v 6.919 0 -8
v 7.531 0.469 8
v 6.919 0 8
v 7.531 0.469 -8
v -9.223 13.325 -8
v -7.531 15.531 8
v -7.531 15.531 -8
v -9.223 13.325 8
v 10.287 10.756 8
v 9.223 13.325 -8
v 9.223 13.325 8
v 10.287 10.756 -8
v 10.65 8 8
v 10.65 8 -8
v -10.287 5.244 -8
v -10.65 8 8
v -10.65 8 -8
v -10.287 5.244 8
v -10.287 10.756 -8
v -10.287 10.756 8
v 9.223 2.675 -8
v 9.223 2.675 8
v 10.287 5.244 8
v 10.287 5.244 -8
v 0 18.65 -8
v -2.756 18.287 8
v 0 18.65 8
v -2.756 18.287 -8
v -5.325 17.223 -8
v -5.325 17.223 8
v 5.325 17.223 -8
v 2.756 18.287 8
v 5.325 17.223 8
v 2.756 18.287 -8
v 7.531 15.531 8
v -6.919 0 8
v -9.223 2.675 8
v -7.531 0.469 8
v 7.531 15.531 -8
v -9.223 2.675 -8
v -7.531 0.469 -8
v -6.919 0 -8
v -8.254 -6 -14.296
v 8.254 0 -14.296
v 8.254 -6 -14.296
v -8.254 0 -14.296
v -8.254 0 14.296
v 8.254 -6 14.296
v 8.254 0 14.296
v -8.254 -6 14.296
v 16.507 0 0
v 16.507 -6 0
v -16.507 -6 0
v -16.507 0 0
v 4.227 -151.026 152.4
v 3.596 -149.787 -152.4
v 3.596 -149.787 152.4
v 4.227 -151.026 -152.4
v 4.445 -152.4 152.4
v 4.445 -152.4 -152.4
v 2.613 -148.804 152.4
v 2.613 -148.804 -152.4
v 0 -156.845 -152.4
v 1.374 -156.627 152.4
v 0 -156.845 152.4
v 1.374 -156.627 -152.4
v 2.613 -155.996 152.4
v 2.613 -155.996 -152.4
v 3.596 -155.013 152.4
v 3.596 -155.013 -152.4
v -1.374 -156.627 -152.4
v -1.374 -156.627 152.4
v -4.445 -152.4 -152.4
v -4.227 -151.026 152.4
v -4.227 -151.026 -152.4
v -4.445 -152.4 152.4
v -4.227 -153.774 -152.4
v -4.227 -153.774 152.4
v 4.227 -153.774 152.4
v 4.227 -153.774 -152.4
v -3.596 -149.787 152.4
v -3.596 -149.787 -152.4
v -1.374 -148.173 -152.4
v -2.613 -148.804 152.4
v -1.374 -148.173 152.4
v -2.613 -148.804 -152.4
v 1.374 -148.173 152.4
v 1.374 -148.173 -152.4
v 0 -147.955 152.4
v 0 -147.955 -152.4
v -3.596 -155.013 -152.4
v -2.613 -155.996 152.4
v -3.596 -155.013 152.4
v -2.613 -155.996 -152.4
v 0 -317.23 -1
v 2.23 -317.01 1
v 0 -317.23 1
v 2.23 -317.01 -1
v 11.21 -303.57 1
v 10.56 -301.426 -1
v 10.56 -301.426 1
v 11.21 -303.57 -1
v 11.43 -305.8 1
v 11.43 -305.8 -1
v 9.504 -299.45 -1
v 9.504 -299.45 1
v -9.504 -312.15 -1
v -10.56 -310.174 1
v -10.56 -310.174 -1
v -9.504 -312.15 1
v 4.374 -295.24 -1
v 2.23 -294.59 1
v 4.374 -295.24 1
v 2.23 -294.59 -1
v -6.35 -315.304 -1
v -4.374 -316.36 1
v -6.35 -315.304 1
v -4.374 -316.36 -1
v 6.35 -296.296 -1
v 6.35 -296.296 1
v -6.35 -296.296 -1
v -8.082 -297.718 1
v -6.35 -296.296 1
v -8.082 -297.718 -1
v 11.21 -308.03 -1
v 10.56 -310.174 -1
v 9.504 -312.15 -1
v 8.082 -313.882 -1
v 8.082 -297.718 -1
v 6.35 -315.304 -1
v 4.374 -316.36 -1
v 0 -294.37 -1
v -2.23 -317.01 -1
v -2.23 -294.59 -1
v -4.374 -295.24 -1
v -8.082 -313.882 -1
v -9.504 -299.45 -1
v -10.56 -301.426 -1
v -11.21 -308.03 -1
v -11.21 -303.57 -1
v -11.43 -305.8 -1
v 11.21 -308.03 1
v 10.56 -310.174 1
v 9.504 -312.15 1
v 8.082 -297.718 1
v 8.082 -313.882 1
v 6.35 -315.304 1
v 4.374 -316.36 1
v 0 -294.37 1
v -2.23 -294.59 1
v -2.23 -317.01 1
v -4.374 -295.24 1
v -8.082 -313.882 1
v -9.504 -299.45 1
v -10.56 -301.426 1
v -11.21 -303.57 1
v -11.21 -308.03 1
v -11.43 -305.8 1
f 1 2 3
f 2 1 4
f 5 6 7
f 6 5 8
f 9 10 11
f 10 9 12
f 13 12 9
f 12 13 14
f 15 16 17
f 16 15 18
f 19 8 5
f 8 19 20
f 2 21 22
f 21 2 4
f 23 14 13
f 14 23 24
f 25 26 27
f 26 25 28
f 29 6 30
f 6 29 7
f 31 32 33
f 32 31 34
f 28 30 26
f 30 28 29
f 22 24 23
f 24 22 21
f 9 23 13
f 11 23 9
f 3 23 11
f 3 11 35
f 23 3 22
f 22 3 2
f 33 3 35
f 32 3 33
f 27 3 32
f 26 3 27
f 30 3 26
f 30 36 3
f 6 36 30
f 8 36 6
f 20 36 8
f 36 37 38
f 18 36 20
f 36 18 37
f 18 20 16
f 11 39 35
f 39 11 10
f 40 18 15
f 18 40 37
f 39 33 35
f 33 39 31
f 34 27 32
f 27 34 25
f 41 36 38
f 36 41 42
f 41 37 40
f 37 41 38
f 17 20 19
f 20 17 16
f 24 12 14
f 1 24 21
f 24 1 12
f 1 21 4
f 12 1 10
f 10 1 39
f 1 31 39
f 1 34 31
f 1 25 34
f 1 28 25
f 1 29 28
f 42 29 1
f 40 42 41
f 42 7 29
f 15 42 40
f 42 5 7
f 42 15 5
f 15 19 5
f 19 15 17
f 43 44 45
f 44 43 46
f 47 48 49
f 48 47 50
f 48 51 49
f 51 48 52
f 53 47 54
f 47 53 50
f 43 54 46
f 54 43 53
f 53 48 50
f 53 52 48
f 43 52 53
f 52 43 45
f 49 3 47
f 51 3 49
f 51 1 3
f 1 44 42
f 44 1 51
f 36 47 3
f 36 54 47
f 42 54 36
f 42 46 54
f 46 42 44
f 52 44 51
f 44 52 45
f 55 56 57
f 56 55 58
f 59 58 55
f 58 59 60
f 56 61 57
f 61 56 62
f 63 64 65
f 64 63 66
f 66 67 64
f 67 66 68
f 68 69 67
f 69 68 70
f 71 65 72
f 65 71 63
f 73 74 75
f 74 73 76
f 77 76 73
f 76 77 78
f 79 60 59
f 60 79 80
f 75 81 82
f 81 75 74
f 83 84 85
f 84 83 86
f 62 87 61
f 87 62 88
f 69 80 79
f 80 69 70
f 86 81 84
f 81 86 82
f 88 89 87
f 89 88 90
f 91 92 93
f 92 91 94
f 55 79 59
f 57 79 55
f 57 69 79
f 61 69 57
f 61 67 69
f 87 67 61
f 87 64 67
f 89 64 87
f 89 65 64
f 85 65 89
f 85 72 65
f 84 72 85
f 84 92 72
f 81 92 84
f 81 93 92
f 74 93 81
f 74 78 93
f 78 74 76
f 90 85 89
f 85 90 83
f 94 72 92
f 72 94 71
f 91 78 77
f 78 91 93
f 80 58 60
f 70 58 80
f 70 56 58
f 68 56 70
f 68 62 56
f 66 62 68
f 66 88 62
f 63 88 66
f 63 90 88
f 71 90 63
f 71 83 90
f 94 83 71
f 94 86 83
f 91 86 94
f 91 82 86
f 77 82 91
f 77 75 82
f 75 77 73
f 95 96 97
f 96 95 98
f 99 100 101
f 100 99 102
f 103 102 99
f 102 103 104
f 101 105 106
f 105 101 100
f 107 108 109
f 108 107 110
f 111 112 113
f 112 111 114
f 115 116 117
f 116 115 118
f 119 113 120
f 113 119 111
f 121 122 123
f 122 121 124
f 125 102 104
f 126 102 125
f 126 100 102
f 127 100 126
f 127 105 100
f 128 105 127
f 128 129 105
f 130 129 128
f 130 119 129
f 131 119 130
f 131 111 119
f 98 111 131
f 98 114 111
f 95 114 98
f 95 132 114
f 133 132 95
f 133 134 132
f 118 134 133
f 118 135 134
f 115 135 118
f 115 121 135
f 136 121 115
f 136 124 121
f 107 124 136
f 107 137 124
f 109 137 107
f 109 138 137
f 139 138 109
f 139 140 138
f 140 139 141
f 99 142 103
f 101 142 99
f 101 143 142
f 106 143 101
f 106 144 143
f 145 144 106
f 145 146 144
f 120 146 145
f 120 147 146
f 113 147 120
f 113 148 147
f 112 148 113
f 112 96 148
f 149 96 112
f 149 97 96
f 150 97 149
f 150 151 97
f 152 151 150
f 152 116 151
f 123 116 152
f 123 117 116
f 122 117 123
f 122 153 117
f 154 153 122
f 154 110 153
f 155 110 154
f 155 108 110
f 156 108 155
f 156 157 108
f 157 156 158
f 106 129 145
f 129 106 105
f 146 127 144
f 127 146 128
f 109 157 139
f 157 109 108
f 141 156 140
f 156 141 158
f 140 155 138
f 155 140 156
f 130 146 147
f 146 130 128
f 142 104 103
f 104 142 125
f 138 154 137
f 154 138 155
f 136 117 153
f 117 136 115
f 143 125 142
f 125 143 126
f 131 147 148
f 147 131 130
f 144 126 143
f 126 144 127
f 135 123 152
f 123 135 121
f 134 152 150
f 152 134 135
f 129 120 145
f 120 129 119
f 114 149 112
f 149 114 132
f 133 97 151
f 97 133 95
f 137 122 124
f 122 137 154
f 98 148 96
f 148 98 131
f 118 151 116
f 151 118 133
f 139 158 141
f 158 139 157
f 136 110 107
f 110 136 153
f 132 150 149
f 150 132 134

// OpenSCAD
// Auto-generated by scripts/author_from_manifest.py (Phase D.3).
// Source: data/phase_d_manifest.json (sku_intent='tyco-ty3596-dry-pendent-286f').
// Do not hand-edit — regenerate from the manifest.
//
// @part tyco_ty3596_dry_pendent_286f
// @kind sprinkler_head
// @category head.pendant.k56
// @display-name "Tyco TY3596 Dry Pendent K5.6 286°F"
// @mfg tyco_fire_protection
// @mfg-pn TY3596
// @listing UL FM
// @hazard-classes LH OH1
// @price-usd 82.00
// @install-minutes 14
// @crew journeyman
// @k-factor 5.6
// @orientation pendant
// @response standard
// @temperature 286F
// @param size_in number default=0.5 label="Size" unit="in"
// @port inlet position=[0,0.014,0] direction=[0,1,0] style=NPT_threaded size_in=0.5 role=drop

size_in = 0.5;
k_factor = 5.6;

length_mm   = 304.80;
body_dia_mm = 25.40;
thread_od   = 21.3;
thread_len  = 16;
deflector_d = body_dia_mm * 0.9;

 union() {
    translate([0, thread_len/2, 0])
        cylinder(h = thread_len, d = thread_od, center = true, $fn = 24);
    translate([0, -3, 0])
        rotate([90, 0, 0])
        cylinder(h = 6, d = thread_od * 1.55, $fn = 6, center = true);
    translate([0, -length_mm/2, 0])
        cylinder(h = length_mm, d = body_dia_mm * 0.35, center = true, $fn = 20);
    translate([0, -length_mm - 1, 0])
        cylinder(h = 2, d = deflector_d, center = true, $fn = 32);
}
